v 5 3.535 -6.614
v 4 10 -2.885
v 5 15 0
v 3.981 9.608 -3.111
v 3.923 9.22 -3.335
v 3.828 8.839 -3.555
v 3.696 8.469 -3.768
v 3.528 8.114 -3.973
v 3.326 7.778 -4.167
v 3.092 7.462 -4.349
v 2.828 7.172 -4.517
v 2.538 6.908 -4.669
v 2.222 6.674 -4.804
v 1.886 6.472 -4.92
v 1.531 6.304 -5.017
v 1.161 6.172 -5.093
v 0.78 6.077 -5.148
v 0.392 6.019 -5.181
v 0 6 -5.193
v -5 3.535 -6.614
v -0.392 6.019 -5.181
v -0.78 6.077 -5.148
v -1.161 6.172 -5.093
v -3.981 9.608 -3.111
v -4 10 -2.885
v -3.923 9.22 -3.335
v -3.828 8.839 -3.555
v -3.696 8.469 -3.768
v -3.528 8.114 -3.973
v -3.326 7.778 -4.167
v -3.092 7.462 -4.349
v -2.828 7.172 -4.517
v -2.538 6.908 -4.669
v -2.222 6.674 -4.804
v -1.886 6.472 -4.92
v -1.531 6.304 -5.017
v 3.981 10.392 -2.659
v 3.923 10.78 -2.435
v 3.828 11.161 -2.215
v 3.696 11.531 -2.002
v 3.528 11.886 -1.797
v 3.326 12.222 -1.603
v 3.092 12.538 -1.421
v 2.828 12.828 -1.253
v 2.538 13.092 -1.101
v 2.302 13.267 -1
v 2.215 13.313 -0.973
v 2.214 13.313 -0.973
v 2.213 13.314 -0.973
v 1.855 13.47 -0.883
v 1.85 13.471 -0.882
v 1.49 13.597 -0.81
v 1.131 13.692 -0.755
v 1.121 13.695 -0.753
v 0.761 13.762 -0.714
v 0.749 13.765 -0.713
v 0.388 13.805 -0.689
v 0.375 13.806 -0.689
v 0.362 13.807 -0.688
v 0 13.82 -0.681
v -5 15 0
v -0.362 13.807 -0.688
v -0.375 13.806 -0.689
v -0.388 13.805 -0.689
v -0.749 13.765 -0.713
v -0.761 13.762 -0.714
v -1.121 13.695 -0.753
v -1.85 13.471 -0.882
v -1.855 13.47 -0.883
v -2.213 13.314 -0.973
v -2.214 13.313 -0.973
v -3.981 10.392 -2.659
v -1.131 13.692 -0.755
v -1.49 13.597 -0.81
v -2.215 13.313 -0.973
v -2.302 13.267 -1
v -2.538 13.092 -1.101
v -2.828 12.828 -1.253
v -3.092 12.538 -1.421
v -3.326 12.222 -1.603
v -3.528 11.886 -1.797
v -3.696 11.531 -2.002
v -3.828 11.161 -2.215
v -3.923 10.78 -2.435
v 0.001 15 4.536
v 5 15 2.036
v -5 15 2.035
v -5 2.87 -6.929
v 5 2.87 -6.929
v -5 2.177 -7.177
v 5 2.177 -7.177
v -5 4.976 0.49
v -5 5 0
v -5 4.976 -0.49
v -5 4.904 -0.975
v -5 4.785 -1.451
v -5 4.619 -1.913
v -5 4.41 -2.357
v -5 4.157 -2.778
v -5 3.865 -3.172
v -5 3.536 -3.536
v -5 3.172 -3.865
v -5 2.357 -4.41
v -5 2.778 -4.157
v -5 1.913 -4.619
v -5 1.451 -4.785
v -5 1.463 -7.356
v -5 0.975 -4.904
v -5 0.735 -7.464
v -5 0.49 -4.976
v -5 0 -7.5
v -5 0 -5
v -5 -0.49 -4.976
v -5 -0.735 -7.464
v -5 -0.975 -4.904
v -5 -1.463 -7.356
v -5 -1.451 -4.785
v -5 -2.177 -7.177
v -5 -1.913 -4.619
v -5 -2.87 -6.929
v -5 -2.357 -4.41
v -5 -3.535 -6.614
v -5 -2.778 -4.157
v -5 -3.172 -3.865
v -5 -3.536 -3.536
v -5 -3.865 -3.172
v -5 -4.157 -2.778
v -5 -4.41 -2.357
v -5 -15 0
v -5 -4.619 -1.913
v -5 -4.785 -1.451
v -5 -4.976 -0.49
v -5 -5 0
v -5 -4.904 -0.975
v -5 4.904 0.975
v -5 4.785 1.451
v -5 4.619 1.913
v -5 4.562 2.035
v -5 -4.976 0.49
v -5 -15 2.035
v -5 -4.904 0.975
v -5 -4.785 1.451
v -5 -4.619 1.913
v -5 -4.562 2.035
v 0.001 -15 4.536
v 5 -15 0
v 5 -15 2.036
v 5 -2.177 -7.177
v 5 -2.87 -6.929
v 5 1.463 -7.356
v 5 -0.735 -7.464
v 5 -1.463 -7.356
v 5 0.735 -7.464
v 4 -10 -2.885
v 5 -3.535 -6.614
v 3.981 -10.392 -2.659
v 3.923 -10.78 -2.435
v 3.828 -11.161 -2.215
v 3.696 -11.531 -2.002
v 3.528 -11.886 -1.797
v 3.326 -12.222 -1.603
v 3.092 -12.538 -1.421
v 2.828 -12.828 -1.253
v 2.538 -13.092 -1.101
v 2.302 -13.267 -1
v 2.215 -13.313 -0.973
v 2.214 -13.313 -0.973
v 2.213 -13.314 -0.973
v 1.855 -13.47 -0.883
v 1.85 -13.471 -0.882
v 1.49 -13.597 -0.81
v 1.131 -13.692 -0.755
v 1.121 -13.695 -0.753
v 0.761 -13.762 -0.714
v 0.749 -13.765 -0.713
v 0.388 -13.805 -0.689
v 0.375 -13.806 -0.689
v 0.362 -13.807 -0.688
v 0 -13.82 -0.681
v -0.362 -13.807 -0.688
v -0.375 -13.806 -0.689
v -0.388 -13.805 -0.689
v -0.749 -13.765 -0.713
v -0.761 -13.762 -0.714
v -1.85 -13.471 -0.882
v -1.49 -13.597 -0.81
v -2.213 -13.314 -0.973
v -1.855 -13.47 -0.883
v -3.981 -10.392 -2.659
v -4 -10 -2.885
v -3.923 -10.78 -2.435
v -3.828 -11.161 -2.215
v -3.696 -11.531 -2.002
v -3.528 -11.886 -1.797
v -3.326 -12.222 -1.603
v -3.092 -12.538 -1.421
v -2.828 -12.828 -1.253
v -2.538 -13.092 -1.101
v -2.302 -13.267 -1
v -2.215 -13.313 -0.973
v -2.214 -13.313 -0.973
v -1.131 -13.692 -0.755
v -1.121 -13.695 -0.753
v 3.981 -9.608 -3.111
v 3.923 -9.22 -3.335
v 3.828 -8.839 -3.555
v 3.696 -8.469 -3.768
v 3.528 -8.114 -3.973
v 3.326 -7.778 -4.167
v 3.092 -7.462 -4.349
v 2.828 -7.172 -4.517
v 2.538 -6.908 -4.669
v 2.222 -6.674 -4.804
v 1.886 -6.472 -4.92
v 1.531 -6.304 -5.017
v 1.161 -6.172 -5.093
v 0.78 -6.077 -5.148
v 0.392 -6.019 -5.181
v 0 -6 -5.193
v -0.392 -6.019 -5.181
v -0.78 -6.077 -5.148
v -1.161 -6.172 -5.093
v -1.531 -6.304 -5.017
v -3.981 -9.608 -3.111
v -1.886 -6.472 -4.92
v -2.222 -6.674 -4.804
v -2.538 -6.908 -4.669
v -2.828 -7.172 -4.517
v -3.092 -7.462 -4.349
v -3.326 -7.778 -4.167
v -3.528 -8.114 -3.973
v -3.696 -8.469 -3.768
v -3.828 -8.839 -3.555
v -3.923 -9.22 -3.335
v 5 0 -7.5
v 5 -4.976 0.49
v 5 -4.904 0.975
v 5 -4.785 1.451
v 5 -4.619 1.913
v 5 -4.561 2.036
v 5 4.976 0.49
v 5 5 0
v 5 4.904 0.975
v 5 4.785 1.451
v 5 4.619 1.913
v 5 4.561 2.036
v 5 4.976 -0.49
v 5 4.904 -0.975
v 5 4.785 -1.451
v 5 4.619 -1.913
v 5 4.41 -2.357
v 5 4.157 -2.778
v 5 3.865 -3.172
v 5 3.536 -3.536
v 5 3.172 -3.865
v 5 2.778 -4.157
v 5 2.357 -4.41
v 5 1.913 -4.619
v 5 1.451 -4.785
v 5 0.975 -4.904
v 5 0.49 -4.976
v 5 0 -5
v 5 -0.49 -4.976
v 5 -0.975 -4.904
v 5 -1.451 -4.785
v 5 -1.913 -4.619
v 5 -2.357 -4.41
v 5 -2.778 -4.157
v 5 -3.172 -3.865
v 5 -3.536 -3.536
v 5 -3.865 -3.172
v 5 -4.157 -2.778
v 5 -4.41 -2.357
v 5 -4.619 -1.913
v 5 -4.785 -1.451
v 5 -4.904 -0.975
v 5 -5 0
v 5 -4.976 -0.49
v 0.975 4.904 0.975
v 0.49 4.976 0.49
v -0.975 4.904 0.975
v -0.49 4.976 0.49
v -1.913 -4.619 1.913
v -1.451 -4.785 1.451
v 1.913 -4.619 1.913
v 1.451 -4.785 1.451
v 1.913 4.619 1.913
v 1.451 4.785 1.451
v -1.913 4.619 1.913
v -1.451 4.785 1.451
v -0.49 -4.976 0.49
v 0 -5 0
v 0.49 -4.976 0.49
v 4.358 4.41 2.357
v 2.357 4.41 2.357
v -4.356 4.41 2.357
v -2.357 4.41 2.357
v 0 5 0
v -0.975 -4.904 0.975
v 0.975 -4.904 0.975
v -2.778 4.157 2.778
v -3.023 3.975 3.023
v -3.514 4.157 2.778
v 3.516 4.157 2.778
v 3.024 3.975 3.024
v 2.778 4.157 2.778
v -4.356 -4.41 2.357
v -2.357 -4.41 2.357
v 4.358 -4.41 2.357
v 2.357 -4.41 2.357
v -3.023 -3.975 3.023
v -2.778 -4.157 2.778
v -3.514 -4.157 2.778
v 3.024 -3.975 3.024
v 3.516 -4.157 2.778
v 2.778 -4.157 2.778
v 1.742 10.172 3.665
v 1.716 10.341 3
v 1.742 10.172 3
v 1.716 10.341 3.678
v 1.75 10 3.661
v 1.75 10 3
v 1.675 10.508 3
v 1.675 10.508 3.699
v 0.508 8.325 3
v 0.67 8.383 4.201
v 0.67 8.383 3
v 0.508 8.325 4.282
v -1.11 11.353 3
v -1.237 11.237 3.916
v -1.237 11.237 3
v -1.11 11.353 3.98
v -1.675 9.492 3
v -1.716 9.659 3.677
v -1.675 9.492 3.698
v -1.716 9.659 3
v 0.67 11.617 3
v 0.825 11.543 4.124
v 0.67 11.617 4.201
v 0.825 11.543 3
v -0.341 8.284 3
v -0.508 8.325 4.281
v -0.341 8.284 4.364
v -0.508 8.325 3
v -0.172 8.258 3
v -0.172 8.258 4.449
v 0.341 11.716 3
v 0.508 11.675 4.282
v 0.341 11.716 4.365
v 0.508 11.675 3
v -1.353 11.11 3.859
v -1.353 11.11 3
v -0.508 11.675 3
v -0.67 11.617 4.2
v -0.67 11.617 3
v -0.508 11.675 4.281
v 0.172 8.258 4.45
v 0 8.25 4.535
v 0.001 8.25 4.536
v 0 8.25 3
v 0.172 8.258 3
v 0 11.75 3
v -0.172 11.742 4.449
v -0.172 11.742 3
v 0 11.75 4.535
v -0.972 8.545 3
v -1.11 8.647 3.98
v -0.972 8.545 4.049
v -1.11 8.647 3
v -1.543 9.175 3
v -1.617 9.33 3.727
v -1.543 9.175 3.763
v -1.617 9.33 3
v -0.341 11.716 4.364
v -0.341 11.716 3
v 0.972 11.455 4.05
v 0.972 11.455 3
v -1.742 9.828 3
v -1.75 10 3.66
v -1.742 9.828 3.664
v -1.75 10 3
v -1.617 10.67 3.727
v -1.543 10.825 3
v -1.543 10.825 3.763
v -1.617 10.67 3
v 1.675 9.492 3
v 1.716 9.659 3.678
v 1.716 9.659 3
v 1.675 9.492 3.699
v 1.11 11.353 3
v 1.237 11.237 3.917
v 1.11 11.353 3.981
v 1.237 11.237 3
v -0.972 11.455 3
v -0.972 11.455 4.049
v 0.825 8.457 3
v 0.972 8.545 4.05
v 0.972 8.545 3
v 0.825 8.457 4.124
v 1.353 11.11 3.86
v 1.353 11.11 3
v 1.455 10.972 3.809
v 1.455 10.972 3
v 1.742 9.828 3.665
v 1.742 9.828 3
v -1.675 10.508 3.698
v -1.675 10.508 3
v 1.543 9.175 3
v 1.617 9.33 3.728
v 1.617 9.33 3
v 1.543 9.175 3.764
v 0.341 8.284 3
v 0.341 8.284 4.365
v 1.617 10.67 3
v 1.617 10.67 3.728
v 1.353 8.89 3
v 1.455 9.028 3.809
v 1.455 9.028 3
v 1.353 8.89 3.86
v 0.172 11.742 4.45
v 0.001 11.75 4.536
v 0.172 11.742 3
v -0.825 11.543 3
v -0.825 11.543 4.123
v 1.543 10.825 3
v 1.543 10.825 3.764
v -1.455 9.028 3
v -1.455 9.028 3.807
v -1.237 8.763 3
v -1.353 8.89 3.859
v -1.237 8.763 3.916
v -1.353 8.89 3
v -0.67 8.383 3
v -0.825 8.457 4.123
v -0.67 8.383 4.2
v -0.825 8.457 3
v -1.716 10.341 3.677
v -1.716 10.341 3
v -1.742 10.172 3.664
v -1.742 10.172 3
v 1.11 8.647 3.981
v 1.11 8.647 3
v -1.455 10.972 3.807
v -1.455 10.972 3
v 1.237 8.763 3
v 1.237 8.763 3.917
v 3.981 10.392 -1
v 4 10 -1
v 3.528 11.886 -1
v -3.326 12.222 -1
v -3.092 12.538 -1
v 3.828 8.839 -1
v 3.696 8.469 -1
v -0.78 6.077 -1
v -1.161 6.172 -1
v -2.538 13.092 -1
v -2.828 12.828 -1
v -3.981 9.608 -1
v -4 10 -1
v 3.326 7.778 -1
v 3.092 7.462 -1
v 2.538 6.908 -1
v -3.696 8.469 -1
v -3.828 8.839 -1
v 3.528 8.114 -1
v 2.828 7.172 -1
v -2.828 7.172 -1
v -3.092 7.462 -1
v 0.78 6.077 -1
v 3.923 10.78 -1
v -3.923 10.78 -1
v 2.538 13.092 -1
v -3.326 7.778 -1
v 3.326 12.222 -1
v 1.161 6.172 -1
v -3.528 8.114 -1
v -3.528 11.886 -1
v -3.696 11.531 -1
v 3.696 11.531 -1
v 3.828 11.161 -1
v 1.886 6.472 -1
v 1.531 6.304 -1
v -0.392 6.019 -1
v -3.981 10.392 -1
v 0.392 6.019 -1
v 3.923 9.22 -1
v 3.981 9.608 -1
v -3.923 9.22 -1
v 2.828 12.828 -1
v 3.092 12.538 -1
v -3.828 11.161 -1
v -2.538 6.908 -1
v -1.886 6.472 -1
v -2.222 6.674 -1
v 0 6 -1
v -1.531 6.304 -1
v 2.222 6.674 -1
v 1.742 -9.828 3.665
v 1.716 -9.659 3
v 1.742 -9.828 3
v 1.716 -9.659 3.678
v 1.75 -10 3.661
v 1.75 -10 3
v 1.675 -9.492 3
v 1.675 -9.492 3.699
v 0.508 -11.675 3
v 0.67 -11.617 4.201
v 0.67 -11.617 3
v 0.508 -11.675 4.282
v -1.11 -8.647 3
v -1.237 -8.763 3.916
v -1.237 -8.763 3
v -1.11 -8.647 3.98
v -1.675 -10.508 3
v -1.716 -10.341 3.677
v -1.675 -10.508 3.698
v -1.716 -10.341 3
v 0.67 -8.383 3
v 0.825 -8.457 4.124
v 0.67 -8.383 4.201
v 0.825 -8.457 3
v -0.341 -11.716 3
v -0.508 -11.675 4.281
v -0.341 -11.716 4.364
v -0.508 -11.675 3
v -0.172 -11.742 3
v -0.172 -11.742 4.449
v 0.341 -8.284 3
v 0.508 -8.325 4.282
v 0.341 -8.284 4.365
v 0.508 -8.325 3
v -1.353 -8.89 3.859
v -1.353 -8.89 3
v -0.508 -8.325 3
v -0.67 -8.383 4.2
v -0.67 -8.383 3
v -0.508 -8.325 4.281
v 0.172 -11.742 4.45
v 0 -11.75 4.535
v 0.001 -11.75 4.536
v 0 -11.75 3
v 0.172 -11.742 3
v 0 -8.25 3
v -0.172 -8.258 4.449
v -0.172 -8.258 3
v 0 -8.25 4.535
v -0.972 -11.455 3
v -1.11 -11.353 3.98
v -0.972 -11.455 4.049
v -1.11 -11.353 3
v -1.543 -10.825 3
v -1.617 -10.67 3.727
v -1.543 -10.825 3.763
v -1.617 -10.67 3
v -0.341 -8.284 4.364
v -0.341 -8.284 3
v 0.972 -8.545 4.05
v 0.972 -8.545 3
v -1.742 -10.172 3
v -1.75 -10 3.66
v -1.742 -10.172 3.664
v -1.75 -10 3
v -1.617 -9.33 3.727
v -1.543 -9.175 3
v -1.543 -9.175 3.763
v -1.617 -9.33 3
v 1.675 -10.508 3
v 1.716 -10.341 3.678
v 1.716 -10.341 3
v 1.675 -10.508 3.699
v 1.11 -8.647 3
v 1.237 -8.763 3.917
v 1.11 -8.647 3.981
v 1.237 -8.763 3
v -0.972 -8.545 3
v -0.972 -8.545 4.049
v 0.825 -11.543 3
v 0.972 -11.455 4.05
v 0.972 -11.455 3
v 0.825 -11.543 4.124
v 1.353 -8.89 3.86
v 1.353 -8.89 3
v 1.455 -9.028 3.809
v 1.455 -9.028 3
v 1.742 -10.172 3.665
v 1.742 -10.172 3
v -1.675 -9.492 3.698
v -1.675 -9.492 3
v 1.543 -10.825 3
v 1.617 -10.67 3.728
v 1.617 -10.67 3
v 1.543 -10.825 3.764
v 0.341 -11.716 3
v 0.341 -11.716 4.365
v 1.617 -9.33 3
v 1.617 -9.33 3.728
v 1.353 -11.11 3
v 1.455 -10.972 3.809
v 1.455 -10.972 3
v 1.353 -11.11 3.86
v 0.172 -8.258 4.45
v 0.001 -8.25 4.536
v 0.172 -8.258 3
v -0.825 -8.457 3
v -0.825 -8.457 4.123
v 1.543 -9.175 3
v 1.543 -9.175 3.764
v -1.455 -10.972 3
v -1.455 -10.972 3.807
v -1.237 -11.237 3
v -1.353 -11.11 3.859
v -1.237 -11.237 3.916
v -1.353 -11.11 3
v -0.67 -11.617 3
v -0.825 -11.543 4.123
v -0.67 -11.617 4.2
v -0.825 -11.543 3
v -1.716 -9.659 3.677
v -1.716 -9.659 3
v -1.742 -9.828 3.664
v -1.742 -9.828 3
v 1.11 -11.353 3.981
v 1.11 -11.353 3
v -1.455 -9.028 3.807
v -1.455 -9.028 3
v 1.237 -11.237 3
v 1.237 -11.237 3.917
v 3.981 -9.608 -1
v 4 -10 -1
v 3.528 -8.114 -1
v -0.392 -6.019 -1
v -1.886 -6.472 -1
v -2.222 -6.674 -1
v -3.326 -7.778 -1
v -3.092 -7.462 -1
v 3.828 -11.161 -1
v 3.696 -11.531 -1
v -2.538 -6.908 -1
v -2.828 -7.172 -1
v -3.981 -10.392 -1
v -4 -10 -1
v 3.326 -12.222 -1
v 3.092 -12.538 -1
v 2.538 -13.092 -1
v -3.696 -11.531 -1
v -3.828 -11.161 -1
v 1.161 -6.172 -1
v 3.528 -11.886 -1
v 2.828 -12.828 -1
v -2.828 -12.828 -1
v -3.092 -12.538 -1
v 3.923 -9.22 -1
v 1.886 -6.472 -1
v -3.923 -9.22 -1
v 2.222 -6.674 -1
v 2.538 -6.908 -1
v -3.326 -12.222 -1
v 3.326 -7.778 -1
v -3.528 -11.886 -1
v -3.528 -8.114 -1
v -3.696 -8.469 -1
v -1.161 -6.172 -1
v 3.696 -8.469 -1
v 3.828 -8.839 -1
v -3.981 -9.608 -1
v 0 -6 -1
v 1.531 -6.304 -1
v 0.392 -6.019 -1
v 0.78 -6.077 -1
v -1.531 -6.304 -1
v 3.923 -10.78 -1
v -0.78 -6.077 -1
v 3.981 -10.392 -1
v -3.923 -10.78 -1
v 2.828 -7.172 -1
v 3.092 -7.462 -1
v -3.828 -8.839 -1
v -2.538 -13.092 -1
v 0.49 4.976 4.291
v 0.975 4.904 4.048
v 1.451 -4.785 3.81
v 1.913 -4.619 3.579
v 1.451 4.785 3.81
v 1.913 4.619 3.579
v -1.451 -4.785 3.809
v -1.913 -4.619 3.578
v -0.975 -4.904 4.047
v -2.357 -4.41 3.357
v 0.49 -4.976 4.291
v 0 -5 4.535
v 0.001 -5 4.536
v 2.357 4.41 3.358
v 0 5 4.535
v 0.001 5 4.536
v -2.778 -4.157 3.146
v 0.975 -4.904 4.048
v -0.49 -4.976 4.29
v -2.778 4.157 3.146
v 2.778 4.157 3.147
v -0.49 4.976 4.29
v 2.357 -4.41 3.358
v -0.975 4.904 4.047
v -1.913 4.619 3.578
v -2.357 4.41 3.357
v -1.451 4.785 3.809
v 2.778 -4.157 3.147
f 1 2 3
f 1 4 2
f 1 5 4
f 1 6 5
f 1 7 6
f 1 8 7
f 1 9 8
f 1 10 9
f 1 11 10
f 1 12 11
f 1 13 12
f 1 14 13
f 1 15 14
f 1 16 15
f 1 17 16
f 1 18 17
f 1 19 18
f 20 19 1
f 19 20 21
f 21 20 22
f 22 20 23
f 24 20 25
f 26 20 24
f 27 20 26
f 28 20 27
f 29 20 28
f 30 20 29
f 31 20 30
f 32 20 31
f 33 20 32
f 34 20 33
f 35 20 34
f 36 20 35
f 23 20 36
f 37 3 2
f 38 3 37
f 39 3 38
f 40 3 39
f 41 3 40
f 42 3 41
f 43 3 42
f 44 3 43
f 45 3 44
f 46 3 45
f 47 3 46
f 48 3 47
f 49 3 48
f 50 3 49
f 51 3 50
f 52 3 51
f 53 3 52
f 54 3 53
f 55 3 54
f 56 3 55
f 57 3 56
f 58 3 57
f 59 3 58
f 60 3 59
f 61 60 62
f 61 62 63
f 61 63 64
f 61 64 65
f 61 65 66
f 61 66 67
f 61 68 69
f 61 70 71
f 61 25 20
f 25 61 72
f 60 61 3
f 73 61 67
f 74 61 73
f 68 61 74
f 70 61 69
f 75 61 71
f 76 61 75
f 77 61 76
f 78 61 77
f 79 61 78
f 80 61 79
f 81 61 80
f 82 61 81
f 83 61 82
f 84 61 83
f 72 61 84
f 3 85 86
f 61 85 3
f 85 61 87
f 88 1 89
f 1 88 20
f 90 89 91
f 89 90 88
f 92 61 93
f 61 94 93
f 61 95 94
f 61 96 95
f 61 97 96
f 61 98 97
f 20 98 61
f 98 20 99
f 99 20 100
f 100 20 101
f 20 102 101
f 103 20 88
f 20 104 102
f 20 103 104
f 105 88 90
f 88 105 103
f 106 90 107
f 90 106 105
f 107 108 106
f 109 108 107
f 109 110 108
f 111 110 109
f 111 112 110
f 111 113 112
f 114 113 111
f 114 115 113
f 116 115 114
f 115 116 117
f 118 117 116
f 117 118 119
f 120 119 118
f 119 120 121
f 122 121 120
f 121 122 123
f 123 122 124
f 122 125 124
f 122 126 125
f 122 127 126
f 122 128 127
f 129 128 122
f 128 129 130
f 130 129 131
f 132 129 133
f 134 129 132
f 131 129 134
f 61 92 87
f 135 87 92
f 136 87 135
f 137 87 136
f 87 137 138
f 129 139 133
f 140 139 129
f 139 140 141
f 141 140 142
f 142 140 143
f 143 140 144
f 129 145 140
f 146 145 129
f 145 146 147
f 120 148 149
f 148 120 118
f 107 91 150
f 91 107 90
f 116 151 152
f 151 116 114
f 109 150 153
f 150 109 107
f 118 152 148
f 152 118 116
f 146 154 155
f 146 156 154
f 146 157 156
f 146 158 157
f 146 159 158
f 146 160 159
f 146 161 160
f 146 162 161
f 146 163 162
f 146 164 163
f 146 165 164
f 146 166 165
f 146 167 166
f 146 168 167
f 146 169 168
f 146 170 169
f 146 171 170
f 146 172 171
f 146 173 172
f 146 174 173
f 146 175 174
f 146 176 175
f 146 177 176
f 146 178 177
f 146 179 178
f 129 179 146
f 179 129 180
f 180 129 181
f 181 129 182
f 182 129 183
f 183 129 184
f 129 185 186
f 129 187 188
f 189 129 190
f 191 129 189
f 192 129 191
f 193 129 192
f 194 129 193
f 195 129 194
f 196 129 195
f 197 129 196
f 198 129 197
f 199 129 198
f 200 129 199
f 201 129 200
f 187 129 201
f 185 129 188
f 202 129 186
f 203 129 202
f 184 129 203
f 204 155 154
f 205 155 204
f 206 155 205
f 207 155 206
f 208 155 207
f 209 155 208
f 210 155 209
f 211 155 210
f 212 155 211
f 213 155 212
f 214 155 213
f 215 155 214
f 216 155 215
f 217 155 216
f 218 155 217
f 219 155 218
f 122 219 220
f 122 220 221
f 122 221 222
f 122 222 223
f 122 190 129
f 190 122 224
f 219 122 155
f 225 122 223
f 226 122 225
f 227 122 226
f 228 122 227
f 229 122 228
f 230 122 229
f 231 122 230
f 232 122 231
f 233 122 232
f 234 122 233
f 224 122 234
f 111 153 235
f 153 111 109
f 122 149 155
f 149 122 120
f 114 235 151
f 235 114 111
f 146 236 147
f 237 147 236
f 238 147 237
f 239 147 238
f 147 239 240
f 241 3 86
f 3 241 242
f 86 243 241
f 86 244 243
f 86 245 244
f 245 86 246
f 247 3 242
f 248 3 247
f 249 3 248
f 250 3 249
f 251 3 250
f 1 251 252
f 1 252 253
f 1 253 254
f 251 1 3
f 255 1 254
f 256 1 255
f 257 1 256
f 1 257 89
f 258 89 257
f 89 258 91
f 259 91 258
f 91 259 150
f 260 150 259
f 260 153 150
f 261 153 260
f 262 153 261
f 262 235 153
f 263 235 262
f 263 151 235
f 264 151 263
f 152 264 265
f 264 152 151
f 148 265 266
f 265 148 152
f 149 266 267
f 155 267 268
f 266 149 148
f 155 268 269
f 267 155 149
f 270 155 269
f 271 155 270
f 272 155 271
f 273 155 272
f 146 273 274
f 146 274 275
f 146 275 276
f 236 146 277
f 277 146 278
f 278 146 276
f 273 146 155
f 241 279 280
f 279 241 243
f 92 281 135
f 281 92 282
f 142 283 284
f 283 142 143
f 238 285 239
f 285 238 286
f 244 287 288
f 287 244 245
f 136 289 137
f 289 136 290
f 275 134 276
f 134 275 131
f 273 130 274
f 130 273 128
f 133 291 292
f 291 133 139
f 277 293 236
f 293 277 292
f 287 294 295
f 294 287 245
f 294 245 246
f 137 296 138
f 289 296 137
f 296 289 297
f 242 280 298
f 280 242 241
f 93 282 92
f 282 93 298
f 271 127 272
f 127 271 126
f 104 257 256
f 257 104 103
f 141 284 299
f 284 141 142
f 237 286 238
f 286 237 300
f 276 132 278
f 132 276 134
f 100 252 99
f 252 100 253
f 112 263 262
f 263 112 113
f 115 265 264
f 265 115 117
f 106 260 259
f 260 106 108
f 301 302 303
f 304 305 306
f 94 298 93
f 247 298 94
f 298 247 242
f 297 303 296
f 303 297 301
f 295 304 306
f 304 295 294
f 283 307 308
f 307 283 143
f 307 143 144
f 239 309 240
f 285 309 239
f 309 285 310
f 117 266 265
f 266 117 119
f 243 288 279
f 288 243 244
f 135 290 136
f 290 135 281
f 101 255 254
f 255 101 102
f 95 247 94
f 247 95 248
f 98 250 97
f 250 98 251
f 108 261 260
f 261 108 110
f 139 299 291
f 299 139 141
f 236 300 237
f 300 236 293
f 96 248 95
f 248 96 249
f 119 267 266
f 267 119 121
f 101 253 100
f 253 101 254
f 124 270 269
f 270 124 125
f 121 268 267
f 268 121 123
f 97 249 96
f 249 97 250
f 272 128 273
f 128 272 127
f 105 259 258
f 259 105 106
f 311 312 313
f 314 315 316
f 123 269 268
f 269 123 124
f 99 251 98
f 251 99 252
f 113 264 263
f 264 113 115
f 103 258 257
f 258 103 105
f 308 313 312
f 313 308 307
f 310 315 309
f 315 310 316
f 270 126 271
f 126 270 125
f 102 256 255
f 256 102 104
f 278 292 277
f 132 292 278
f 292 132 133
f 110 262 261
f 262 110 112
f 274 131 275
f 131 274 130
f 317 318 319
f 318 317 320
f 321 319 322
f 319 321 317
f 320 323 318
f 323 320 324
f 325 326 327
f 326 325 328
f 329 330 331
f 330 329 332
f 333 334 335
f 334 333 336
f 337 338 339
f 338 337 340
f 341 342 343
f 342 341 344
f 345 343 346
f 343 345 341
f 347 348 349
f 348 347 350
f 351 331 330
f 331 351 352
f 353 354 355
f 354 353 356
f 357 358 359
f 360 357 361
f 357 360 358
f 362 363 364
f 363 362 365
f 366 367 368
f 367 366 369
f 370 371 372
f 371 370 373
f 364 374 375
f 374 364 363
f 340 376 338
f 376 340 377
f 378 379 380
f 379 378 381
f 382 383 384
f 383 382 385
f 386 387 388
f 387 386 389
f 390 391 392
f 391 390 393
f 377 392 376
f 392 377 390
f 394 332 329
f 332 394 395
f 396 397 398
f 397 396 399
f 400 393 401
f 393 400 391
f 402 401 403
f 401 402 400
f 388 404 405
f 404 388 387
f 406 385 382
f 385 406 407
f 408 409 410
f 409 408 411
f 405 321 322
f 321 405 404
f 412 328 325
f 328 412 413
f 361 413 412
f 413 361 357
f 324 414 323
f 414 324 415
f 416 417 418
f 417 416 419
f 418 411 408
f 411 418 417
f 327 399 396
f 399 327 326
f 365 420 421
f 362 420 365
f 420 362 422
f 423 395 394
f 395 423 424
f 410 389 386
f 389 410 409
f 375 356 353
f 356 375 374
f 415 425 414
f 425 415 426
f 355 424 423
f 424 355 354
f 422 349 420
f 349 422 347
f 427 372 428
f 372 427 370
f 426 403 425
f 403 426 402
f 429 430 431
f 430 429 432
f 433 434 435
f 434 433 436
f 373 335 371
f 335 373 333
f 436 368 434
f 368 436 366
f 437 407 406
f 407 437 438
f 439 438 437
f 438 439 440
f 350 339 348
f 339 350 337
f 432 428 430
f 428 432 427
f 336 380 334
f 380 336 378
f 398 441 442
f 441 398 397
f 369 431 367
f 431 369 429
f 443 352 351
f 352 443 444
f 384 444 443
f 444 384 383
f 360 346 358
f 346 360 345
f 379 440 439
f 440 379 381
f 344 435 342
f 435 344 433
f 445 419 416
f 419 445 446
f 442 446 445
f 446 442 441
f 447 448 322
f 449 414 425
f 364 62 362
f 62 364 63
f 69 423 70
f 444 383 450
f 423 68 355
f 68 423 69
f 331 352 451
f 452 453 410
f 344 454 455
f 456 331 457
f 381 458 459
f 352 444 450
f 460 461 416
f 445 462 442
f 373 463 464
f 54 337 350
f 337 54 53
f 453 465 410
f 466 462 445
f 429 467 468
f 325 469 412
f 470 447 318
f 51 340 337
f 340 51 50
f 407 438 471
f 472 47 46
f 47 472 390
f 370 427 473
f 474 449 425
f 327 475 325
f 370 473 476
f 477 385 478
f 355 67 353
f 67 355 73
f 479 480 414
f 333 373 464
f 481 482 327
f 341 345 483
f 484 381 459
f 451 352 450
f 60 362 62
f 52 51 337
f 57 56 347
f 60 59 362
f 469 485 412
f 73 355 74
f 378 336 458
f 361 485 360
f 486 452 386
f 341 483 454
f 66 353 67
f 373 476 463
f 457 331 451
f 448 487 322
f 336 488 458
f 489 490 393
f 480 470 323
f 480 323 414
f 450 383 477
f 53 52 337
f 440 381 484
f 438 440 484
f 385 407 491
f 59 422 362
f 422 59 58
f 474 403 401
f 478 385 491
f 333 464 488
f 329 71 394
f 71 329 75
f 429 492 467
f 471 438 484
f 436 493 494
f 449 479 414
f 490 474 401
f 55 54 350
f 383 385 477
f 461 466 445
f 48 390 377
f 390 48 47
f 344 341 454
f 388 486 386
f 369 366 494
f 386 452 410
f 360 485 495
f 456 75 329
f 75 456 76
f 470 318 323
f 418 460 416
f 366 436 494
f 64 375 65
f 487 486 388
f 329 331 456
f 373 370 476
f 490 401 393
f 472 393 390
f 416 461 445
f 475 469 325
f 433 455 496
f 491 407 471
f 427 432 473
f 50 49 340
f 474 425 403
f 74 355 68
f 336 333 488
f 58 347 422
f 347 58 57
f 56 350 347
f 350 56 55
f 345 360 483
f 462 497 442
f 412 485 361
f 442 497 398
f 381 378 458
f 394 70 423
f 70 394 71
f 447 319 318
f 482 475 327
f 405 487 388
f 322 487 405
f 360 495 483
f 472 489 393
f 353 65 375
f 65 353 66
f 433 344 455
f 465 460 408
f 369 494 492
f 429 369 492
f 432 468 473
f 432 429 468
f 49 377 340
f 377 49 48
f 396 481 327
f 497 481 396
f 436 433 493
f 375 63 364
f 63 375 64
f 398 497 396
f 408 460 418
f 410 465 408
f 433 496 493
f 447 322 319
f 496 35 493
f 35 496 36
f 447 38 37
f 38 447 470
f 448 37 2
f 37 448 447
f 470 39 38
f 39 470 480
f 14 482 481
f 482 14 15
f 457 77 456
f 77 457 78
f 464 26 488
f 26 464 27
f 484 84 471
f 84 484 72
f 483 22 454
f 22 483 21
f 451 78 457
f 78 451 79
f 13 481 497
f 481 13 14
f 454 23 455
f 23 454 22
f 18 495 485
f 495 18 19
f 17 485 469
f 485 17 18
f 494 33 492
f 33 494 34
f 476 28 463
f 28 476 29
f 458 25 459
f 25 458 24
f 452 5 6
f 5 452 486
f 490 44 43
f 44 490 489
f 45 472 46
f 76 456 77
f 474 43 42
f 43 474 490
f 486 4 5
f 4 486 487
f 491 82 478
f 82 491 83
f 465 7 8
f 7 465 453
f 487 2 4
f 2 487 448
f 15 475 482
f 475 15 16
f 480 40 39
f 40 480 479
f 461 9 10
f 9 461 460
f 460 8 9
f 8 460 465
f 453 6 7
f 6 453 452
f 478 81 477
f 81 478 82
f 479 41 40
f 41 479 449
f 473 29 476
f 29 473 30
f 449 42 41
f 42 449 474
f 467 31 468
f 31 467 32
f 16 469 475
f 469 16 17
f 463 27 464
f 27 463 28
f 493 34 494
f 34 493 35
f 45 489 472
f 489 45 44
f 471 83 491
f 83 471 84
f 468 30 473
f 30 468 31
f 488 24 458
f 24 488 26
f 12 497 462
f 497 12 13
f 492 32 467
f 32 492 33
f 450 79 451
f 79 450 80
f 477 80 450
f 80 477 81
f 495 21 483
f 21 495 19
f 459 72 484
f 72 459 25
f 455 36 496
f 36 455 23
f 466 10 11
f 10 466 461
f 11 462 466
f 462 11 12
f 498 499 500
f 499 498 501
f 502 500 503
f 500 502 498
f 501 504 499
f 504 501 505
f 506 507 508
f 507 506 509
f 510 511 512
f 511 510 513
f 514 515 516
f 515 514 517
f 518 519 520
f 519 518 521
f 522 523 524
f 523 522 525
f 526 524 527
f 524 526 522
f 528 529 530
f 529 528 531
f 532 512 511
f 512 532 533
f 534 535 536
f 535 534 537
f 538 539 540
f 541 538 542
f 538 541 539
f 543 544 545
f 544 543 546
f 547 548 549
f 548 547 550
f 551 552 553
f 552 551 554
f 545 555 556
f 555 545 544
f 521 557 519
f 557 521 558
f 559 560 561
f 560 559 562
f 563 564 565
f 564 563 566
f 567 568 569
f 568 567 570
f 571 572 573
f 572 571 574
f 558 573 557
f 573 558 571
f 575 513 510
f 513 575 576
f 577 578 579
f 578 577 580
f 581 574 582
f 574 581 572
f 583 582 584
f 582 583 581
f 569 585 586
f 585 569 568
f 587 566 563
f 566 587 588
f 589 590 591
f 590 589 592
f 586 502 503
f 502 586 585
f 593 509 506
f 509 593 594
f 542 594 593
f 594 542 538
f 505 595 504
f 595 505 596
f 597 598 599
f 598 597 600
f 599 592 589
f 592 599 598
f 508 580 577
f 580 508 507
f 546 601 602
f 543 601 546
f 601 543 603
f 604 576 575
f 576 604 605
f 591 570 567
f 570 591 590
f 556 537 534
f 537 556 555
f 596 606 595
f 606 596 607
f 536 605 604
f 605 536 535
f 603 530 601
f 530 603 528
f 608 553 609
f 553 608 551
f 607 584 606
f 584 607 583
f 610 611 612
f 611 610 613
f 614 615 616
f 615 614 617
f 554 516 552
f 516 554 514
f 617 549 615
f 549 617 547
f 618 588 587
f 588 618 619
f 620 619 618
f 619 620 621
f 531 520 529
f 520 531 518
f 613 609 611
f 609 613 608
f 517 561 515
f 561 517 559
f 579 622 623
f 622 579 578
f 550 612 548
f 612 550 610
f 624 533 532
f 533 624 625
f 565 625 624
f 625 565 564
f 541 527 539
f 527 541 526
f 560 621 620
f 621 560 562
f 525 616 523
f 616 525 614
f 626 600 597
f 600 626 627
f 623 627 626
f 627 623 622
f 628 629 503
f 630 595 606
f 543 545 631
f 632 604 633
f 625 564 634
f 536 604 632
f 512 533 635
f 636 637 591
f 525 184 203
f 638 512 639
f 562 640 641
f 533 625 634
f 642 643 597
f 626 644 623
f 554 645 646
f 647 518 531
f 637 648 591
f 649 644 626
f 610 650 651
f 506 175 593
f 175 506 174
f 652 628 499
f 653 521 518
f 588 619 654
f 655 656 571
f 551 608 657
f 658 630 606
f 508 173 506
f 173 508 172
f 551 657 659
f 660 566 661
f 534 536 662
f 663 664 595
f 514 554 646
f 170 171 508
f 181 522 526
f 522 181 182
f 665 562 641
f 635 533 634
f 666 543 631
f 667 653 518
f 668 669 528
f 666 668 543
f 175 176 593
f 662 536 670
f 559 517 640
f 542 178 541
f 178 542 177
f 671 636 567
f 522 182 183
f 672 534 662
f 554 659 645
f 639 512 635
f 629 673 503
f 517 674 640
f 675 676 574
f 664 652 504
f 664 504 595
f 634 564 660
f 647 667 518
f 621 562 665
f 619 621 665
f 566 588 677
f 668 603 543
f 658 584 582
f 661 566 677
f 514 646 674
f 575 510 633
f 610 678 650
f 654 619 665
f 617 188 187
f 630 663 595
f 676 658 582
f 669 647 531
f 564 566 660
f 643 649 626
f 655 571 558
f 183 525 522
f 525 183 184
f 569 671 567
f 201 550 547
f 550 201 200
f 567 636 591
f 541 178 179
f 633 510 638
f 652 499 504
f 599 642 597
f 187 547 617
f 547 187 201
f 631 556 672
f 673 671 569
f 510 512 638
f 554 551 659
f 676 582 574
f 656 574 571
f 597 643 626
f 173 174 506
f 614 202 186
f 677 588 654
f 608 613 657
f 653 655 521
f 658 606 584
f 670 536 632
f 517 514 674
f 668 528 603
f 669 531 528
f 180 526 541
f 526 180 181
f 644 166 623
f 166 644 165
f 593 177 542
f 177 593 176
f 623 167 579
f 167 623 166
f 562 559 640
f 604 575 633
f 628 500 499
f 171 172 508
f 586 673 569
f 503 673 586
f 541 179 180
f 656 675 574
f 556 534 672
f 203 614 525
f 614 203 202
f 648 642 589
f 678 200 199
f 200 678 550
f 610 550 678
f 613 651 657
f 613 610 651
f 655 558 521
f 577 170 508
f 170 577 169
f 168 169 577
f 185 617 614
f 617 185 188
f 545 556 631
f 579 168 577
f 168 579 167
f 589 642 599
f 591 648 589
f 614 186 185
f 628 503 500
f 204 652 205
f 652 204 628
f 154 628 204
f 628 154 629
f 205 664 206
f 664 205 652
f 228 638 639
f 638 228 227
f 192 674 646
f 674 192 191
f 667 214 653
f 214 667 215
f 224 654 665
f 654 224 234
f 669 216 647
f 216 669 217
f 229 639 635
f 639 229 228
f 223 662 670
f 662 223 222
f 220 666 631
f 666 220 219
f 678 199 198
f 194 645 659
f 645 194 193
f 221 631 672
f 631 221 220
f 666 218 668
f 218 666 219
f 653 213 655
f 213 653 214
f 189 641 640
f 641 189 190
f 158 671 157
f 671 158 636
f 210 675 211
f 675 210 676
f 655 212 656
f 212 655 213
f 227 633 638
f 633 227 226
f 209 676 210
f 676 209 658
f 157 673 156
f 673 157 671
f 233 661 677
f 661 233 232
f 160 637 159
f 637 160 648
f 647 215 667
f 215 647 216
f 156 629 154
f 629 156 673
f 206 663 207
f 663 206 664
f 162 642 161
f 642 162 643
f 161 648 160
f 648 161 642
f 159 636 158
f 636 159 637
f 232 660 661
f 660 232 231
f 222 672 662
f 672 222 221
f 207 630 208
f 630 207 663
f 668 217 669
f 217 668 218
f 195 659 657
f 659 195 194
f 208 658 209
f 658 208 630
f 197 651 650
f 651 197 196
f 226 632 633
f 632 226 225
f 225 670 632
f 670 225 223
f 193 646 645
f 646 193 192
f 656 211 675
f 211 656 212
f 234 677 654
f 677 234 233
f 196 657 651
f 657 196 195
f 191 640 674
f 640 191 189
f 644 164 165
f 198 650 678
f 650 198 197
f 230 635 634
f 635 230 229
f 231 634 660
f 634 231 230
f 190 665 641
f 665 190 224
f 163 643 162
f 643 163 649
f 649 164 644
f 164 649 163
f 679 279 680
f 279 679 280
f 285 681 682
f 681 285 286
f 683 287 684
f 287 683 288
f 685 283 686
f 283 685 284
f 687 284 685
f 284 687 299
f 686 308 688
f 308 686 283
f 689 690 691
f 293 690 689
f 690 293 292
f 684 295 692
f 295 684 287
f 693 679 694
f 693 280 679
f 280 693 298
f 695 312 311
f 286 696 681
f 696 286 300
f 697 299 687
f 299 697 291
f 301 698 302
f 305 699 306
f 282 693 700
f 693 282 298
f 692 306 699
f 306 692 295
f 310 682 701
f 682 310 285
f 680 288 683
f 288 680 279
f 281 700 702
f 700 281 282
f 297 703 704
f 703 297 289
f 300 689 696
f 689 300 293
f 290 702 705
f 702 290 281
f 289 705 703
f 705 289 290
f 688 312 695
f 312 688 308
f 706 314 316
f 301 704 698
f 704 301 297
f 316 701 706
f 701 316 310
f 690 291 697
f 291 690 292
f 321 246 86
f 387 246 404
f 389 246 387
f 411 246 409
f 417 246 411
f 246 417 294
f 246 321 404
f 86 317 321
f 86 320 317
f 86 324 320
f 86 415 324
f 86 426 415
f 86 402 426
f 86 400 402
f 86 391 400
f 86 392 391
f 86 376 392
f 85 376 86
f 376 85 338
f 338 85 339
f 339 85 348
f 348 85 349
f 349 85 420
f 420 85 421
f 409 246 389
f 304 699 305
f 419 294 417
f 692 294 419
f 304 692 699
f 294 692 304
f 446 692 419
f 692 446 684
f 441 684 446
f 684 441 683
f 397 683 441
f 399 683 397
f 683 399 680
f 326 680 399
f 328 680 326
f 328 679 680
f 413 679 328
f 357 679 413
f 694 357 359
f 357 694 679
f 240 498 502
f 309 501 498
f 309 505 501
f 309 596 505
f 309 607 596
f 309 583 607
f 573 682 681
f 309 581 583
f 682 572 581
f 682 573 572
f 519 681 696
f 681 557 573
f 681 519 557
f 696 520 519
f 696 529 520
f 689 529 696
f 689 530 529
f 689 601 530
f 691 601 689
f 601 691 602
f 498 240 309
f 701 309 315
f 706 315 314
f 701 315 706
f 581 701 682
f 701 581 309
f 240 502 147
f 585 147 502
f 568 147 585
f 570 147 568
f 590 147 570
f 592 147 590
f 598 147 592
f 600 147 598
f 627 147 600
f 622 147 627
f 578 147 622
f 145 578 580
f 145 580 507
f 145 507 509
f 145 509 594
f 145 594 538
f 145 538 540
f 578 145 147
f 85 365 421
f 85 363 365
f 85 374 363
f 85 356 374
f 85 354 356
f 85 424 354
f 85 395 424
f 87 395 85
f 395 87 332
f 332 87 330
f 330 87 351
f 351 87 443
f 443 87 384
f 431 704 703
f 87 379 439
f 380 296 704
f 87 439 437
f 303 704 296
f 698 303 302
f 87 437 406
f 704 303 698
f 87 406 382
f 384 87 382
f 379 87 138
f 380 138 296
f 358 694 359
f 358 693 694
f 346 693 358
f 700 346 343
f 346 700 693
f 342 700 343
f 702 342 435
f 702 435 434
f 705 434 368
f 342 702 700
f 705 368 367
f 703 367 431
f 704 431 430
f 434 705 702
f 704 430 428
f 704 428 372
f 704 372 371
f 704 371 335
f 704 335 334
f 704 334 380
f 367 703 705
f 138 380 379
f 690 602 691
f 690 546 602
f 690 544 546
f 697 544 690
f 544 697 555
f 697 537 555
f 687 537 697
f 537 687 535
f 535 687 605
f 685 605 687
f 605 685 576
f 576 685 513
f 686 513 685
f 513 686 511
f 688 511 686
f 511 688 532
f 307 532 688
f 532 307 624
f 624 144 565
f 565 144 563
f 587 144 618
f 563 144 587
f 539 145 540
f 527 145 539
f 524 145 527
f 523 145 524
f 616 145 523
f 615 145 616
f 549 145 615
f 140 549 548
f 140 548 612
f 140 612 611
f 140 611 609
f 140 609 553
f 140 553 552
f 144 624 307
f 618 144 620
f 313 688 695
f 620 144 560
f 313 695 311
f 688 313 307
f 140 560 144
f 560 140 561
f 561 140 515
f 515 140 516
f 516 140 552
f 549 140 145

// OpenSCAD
BRACKET_LENGTH = 10;
CORD_DIAM = 10;
MARGIN = 5;
SCREW_DIAM = 3.5;
DRYWALL_ANCHOR_DIAM = 4;
DRYWALL_ANCHOR_HEAD_DIAM = CORD_DIAM; //8;
ANCHOR_DIAM = 4;

module woodscrew_hole() {
    translate([0, 0, -1]) cylinder(d=SCREW_DIAM, h=16, $fn=64);
    #translate([0, 0, -5]) cylinder(d1=8, d2=SCREW_DIAM, h=4, $fn=64);
    translate([0, 0, -35]) cylinder(d=8, h=30, $fn=64);
}

intersection() {
//difference() {
    difference() {
        translate([0.5 * BRACKET_LENGTH, 0, 0]) rotate([0, -90, 0]) difference() {
            hull() {
                translate([0, -0.5 * (CORD_DIAM + (4*MARGIN)), 0]) cube([1.0 * (CORD_DIAM + MARGIN), CORD_DIAM + (4*MARGIN), BRACKET_LENGTH]);
                cylinder(d=CORD_DIAM+MARGIN, h=BRACKET_LENGTH, $fn=64);
            }
            cylinder(d=CORD_DIAM, h=BRACKET_LENGTH, $fn=64);
        }
        cylinder(d=DRYWALL_ANCHOR_DIAM, h=CORD_DIAM * 2, $fn=64);
        cylinder(d=DRYWALL_ANCHOR_HEAD_DIAM, h=0.8 * CORD_DIAM, $fn=64);
        translate([0, CORD_DIAM, 4]) {
            woodscrew_hole();
        }
        translate([0, -1 * CORD_DIAM, 4]) {
            woodscrew_hole();
        }
    }
    union() {
        DROP = 1;
        translate([1.414 * 0.5 * -10, -50, DROP]) scale([1, 1, 0.5]) rotate([0, 45, 0]) cube([10, 100, 10]);
        translate([-25, -25, -50]) cube(50);
    }
}
